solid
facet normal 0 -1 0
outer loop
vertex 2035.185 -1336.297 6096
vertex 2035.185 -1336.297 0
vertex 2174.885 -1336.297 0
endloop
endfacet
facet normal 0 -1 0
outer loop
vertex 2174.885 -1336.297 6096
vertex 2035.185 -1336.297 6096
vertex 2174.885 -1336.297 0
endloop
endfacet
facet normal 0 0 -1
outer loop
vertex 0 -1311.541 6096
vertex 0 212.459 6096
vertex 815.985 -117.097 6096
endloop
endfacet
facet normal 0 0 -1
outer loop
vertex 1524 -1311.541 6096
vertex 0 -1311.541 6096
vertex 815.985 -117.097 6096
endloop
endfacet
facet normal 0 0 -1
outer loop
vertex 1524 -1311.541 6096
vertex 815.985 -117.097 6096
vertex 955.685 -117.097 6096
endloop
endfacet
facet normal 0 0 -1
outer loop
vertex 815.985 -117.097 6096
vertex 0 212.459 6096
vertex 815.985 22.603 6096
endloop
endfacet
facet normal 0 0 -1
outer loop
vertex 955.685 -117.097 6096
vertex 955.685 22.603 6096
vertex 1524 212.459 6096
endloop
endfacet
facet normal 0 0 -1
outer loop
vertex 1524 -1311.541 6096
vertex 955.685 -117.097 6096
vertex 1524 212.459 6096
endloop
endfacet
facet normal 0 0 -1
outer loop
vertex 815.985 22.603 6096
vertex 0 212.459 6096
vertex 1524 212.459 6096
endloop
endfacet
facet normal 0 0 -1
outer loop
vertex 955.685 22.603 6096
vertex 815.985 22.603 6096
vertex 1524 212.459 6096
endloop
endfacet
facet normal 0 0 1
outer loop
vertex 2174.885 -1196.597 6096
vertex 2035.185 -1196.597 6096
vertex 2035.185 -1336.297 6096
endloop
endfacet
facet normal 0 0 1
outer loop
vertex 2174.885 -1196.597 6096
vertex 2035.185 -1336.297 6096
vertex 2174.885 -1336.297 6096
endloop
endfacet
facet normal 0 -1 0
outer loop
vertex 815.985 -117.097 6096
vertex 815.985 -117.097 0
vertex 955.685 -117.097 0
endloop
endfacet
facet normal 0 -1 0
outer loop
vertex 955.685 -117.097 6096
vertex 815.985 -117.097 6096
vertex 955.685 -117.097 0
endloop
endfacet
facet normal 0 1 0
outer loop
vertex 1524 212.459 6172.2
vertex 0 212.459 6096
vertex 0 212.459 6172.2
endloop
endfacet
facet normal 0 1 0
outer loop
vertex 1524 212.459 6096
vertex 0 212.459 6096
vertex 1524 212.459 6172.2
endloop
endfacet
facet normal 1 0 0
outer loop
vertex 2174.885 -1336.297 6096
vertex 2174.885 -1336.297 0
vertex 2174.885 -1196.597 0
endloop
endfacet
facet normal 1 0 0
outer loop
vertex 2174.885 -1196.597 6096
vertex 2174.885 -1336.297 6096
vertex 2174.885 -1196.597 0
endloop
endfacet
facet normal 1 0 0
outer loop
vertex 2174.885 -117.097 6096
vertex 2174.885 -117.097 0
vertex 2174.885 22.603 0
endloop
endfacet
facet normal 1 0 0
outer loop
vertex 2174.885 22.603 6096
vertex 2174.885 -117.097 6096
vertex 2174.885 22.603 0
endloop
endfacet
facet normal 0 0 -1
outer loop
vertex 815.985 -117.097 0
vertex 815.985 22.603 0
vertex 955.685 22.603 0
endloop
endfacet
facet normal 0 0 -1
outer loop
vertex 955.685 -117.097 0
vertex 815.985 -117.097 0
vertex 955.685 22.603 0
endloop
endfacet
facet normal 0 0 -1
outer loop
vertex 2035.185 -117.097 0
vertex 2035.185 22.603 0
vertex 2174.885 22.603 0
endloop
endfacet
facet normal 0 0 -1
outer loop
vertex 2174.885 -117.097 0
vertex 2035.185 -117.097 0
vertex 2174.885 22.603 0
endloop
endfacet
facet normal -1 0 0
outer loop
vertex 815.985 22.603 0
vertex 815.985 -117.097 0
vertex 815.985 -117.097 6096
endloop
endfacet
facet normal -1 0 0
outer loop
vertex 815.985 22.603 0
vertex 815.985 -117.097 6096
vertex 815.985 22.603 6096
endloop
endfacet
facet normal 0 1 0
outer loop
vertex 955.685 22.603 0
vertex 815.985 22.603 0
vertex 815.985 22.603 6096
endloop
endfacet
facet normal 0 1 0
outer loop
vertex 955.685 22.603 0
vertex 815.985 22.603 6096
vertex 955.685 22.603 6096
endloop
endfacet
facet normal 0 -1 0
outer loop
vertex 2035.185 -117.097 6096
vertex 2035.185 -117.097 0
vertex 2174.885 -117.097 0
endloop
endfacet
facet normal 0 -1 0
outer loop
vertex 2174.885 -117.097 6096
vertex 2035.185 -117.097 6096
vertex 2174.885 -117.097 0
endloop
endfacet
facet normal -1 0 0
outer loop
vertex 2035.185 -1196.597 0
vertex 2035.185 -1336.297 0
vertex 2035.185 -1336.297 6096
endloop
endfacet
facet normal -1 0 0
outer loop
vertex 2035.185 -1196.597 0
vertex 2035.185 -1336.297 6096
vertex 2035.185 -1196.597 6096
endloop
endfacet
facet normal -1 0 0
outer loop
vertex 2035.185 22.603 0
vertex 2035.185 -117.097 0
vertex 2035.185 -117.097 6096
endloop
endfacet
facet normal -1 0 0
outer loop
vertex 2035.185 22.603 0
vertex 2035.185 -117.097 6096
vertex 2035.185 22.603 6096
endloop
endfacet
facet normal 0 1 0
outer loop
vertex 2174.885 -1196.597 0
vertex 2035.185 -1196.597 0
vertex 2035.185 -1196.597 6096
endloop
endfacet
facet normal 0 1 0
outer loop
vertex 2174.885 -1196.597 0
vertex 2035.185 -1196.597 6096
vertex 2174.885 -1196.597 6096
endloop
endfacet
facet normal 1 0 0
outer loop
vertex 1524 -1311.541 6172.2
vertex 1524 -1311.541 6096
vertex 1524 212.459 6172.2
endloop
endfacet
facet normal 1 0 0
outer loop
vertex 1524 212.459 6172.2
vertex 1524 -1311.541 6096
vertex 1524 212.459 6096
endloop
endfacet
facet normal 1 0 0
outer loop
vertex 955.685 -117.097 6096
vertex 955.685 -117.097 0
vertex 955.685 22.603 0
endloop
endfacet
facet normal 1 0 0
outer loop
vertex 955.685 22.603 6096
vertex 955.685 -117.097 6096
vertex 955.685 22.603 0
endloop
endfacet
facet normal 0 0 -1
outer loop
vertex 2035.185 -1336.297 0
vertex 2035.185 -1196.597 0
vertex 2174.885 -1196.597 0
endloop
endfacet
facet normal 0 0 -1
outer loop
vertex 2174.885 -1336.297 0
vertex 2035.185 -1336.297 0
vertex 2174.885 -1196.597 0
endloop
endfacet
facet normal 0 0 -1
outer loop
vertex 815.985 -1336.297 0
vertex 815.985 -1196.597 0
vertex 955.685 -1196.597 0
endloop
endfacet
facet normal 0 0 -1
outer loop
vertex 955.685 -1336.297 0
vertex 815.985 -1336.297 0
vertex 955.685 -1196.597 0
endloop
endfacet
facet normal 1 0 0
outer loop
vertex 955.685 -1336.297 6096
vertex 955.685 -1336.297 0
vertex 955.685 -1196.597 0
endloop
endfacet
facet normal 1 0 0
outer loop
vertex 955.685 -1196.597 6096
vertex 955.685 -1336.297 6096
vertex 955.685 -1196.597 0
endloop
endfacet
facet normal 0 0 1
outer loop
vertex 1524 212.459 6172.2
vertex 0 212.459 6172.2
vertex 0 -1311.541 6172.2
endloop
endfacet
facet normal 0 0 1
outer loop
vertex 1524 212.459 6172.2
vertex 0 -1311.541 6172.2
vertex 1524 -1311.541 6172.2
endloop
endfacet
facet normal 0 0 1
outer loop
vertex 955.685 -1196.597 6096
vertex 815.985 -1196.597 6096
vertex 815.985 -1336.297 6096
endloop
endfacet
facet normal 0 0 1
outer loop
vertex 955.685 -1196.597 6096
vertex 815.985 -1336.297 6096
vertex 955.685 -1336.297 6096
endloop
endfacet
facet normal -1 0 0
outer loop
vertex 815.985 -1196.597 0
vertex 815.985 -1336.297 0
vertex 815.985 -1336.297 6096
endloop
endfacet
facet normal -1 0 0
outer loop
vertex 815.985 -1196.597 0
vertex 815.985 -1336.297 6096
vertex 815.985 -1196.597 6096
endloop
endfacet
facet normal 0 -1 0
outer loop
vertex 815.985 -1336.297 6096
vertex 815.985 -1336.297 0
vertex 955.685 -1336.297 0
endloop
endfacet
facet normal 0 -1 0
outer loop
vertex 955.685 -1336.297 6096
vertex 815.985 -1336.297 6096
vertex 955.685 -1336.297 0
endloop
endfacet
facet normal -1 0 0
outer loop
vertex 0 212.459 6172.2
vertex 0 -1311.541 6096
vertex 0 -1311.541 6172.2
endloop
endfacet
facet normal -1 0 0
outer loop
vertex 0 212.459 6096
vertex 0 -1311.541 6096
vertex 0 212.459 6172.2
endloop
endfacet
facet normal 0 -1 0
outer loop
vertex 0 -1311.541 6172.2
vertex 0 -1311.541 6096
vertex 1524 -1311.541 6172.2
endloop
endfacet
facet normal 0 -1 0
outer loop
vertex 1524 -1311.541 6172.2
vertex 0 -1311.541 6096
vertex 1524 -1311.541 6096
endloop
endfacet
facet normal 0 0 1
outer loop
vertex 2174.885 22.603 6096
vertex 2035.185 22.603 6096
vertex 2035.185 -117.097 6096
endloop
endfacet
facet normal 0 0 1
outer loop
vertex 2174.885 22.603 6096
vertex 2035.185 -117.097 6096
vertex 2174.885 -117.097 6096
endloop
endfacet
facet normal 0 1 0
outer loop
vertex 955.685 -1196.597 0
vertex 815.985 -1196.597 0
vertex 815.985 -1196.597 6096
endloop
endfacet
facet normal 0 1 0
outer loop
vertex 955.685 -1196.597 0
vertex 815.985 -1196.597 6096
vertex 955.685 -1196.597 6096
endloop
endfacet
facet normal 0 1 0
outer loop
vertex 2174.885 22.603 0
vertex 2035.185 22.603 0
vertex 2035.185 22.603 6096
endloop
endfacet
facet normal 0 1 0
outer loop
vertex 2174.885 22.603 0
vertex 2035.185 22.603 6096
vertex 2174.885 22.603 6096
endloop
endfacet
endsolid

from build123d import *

# Parameters (mm, degrees)
F0_W     = 139.7
F0_H     = 139.7
F1_DEPTH = 6096
F2_W     = 1524
F2_H     = 1524
F3_DEPTH = 76.2


with BuildPart() as f1:
    # F0 (on Top) → F1 (new body)
    with BuildSketch(Plane.XY):
        with Locations((885.8353570938, -47.2469480515)):
            Rectangle(F0_W, F0_H)
    extrude(amount=F1_DEPTH)

    # F2 (on face) → F3 (join)
    with BuildSketch(Plane.XY.offset(6096)):
        with Locations((762, -549.5412114536)):
            Rectangle(F2_W, F2_H)
    extrude(amount=F3_DEPTH)


with BuildPart() as f1b:
    # F0 (on Top) → F1, piece 2 (new body)
    with BuildSketch(Plane.XY):
        with Locations((2105.0353570938, -47.2469480515)):
            Rectangle(F0_W, F0_H)
    extrude(amount=F1_DEPTH)


with BuildPart() as f1c:
    # F0 (on Top) → F1, piece 3 (new body)
    with BuildSketch(Plane.XY):
        with Locations((2105.0353570938, -1266.4469480515)):
            Rectangle(F0_W, F0_H)
    extrude(amount=F1_DEPTH)


with BuildPart() as f1d:
    # F0 (on Top) → F1, piece 4 (new body)
    with BuildSketch(Plane.XY):
        with Locations((885.8353570938, -1266.4469480515)):
            Rectangle(F0_W, F0_H)
    extrude(amount=F1_DEPTH)


solid = Compound([f1.part, f1b.part, f1c.part, f1d.part])
